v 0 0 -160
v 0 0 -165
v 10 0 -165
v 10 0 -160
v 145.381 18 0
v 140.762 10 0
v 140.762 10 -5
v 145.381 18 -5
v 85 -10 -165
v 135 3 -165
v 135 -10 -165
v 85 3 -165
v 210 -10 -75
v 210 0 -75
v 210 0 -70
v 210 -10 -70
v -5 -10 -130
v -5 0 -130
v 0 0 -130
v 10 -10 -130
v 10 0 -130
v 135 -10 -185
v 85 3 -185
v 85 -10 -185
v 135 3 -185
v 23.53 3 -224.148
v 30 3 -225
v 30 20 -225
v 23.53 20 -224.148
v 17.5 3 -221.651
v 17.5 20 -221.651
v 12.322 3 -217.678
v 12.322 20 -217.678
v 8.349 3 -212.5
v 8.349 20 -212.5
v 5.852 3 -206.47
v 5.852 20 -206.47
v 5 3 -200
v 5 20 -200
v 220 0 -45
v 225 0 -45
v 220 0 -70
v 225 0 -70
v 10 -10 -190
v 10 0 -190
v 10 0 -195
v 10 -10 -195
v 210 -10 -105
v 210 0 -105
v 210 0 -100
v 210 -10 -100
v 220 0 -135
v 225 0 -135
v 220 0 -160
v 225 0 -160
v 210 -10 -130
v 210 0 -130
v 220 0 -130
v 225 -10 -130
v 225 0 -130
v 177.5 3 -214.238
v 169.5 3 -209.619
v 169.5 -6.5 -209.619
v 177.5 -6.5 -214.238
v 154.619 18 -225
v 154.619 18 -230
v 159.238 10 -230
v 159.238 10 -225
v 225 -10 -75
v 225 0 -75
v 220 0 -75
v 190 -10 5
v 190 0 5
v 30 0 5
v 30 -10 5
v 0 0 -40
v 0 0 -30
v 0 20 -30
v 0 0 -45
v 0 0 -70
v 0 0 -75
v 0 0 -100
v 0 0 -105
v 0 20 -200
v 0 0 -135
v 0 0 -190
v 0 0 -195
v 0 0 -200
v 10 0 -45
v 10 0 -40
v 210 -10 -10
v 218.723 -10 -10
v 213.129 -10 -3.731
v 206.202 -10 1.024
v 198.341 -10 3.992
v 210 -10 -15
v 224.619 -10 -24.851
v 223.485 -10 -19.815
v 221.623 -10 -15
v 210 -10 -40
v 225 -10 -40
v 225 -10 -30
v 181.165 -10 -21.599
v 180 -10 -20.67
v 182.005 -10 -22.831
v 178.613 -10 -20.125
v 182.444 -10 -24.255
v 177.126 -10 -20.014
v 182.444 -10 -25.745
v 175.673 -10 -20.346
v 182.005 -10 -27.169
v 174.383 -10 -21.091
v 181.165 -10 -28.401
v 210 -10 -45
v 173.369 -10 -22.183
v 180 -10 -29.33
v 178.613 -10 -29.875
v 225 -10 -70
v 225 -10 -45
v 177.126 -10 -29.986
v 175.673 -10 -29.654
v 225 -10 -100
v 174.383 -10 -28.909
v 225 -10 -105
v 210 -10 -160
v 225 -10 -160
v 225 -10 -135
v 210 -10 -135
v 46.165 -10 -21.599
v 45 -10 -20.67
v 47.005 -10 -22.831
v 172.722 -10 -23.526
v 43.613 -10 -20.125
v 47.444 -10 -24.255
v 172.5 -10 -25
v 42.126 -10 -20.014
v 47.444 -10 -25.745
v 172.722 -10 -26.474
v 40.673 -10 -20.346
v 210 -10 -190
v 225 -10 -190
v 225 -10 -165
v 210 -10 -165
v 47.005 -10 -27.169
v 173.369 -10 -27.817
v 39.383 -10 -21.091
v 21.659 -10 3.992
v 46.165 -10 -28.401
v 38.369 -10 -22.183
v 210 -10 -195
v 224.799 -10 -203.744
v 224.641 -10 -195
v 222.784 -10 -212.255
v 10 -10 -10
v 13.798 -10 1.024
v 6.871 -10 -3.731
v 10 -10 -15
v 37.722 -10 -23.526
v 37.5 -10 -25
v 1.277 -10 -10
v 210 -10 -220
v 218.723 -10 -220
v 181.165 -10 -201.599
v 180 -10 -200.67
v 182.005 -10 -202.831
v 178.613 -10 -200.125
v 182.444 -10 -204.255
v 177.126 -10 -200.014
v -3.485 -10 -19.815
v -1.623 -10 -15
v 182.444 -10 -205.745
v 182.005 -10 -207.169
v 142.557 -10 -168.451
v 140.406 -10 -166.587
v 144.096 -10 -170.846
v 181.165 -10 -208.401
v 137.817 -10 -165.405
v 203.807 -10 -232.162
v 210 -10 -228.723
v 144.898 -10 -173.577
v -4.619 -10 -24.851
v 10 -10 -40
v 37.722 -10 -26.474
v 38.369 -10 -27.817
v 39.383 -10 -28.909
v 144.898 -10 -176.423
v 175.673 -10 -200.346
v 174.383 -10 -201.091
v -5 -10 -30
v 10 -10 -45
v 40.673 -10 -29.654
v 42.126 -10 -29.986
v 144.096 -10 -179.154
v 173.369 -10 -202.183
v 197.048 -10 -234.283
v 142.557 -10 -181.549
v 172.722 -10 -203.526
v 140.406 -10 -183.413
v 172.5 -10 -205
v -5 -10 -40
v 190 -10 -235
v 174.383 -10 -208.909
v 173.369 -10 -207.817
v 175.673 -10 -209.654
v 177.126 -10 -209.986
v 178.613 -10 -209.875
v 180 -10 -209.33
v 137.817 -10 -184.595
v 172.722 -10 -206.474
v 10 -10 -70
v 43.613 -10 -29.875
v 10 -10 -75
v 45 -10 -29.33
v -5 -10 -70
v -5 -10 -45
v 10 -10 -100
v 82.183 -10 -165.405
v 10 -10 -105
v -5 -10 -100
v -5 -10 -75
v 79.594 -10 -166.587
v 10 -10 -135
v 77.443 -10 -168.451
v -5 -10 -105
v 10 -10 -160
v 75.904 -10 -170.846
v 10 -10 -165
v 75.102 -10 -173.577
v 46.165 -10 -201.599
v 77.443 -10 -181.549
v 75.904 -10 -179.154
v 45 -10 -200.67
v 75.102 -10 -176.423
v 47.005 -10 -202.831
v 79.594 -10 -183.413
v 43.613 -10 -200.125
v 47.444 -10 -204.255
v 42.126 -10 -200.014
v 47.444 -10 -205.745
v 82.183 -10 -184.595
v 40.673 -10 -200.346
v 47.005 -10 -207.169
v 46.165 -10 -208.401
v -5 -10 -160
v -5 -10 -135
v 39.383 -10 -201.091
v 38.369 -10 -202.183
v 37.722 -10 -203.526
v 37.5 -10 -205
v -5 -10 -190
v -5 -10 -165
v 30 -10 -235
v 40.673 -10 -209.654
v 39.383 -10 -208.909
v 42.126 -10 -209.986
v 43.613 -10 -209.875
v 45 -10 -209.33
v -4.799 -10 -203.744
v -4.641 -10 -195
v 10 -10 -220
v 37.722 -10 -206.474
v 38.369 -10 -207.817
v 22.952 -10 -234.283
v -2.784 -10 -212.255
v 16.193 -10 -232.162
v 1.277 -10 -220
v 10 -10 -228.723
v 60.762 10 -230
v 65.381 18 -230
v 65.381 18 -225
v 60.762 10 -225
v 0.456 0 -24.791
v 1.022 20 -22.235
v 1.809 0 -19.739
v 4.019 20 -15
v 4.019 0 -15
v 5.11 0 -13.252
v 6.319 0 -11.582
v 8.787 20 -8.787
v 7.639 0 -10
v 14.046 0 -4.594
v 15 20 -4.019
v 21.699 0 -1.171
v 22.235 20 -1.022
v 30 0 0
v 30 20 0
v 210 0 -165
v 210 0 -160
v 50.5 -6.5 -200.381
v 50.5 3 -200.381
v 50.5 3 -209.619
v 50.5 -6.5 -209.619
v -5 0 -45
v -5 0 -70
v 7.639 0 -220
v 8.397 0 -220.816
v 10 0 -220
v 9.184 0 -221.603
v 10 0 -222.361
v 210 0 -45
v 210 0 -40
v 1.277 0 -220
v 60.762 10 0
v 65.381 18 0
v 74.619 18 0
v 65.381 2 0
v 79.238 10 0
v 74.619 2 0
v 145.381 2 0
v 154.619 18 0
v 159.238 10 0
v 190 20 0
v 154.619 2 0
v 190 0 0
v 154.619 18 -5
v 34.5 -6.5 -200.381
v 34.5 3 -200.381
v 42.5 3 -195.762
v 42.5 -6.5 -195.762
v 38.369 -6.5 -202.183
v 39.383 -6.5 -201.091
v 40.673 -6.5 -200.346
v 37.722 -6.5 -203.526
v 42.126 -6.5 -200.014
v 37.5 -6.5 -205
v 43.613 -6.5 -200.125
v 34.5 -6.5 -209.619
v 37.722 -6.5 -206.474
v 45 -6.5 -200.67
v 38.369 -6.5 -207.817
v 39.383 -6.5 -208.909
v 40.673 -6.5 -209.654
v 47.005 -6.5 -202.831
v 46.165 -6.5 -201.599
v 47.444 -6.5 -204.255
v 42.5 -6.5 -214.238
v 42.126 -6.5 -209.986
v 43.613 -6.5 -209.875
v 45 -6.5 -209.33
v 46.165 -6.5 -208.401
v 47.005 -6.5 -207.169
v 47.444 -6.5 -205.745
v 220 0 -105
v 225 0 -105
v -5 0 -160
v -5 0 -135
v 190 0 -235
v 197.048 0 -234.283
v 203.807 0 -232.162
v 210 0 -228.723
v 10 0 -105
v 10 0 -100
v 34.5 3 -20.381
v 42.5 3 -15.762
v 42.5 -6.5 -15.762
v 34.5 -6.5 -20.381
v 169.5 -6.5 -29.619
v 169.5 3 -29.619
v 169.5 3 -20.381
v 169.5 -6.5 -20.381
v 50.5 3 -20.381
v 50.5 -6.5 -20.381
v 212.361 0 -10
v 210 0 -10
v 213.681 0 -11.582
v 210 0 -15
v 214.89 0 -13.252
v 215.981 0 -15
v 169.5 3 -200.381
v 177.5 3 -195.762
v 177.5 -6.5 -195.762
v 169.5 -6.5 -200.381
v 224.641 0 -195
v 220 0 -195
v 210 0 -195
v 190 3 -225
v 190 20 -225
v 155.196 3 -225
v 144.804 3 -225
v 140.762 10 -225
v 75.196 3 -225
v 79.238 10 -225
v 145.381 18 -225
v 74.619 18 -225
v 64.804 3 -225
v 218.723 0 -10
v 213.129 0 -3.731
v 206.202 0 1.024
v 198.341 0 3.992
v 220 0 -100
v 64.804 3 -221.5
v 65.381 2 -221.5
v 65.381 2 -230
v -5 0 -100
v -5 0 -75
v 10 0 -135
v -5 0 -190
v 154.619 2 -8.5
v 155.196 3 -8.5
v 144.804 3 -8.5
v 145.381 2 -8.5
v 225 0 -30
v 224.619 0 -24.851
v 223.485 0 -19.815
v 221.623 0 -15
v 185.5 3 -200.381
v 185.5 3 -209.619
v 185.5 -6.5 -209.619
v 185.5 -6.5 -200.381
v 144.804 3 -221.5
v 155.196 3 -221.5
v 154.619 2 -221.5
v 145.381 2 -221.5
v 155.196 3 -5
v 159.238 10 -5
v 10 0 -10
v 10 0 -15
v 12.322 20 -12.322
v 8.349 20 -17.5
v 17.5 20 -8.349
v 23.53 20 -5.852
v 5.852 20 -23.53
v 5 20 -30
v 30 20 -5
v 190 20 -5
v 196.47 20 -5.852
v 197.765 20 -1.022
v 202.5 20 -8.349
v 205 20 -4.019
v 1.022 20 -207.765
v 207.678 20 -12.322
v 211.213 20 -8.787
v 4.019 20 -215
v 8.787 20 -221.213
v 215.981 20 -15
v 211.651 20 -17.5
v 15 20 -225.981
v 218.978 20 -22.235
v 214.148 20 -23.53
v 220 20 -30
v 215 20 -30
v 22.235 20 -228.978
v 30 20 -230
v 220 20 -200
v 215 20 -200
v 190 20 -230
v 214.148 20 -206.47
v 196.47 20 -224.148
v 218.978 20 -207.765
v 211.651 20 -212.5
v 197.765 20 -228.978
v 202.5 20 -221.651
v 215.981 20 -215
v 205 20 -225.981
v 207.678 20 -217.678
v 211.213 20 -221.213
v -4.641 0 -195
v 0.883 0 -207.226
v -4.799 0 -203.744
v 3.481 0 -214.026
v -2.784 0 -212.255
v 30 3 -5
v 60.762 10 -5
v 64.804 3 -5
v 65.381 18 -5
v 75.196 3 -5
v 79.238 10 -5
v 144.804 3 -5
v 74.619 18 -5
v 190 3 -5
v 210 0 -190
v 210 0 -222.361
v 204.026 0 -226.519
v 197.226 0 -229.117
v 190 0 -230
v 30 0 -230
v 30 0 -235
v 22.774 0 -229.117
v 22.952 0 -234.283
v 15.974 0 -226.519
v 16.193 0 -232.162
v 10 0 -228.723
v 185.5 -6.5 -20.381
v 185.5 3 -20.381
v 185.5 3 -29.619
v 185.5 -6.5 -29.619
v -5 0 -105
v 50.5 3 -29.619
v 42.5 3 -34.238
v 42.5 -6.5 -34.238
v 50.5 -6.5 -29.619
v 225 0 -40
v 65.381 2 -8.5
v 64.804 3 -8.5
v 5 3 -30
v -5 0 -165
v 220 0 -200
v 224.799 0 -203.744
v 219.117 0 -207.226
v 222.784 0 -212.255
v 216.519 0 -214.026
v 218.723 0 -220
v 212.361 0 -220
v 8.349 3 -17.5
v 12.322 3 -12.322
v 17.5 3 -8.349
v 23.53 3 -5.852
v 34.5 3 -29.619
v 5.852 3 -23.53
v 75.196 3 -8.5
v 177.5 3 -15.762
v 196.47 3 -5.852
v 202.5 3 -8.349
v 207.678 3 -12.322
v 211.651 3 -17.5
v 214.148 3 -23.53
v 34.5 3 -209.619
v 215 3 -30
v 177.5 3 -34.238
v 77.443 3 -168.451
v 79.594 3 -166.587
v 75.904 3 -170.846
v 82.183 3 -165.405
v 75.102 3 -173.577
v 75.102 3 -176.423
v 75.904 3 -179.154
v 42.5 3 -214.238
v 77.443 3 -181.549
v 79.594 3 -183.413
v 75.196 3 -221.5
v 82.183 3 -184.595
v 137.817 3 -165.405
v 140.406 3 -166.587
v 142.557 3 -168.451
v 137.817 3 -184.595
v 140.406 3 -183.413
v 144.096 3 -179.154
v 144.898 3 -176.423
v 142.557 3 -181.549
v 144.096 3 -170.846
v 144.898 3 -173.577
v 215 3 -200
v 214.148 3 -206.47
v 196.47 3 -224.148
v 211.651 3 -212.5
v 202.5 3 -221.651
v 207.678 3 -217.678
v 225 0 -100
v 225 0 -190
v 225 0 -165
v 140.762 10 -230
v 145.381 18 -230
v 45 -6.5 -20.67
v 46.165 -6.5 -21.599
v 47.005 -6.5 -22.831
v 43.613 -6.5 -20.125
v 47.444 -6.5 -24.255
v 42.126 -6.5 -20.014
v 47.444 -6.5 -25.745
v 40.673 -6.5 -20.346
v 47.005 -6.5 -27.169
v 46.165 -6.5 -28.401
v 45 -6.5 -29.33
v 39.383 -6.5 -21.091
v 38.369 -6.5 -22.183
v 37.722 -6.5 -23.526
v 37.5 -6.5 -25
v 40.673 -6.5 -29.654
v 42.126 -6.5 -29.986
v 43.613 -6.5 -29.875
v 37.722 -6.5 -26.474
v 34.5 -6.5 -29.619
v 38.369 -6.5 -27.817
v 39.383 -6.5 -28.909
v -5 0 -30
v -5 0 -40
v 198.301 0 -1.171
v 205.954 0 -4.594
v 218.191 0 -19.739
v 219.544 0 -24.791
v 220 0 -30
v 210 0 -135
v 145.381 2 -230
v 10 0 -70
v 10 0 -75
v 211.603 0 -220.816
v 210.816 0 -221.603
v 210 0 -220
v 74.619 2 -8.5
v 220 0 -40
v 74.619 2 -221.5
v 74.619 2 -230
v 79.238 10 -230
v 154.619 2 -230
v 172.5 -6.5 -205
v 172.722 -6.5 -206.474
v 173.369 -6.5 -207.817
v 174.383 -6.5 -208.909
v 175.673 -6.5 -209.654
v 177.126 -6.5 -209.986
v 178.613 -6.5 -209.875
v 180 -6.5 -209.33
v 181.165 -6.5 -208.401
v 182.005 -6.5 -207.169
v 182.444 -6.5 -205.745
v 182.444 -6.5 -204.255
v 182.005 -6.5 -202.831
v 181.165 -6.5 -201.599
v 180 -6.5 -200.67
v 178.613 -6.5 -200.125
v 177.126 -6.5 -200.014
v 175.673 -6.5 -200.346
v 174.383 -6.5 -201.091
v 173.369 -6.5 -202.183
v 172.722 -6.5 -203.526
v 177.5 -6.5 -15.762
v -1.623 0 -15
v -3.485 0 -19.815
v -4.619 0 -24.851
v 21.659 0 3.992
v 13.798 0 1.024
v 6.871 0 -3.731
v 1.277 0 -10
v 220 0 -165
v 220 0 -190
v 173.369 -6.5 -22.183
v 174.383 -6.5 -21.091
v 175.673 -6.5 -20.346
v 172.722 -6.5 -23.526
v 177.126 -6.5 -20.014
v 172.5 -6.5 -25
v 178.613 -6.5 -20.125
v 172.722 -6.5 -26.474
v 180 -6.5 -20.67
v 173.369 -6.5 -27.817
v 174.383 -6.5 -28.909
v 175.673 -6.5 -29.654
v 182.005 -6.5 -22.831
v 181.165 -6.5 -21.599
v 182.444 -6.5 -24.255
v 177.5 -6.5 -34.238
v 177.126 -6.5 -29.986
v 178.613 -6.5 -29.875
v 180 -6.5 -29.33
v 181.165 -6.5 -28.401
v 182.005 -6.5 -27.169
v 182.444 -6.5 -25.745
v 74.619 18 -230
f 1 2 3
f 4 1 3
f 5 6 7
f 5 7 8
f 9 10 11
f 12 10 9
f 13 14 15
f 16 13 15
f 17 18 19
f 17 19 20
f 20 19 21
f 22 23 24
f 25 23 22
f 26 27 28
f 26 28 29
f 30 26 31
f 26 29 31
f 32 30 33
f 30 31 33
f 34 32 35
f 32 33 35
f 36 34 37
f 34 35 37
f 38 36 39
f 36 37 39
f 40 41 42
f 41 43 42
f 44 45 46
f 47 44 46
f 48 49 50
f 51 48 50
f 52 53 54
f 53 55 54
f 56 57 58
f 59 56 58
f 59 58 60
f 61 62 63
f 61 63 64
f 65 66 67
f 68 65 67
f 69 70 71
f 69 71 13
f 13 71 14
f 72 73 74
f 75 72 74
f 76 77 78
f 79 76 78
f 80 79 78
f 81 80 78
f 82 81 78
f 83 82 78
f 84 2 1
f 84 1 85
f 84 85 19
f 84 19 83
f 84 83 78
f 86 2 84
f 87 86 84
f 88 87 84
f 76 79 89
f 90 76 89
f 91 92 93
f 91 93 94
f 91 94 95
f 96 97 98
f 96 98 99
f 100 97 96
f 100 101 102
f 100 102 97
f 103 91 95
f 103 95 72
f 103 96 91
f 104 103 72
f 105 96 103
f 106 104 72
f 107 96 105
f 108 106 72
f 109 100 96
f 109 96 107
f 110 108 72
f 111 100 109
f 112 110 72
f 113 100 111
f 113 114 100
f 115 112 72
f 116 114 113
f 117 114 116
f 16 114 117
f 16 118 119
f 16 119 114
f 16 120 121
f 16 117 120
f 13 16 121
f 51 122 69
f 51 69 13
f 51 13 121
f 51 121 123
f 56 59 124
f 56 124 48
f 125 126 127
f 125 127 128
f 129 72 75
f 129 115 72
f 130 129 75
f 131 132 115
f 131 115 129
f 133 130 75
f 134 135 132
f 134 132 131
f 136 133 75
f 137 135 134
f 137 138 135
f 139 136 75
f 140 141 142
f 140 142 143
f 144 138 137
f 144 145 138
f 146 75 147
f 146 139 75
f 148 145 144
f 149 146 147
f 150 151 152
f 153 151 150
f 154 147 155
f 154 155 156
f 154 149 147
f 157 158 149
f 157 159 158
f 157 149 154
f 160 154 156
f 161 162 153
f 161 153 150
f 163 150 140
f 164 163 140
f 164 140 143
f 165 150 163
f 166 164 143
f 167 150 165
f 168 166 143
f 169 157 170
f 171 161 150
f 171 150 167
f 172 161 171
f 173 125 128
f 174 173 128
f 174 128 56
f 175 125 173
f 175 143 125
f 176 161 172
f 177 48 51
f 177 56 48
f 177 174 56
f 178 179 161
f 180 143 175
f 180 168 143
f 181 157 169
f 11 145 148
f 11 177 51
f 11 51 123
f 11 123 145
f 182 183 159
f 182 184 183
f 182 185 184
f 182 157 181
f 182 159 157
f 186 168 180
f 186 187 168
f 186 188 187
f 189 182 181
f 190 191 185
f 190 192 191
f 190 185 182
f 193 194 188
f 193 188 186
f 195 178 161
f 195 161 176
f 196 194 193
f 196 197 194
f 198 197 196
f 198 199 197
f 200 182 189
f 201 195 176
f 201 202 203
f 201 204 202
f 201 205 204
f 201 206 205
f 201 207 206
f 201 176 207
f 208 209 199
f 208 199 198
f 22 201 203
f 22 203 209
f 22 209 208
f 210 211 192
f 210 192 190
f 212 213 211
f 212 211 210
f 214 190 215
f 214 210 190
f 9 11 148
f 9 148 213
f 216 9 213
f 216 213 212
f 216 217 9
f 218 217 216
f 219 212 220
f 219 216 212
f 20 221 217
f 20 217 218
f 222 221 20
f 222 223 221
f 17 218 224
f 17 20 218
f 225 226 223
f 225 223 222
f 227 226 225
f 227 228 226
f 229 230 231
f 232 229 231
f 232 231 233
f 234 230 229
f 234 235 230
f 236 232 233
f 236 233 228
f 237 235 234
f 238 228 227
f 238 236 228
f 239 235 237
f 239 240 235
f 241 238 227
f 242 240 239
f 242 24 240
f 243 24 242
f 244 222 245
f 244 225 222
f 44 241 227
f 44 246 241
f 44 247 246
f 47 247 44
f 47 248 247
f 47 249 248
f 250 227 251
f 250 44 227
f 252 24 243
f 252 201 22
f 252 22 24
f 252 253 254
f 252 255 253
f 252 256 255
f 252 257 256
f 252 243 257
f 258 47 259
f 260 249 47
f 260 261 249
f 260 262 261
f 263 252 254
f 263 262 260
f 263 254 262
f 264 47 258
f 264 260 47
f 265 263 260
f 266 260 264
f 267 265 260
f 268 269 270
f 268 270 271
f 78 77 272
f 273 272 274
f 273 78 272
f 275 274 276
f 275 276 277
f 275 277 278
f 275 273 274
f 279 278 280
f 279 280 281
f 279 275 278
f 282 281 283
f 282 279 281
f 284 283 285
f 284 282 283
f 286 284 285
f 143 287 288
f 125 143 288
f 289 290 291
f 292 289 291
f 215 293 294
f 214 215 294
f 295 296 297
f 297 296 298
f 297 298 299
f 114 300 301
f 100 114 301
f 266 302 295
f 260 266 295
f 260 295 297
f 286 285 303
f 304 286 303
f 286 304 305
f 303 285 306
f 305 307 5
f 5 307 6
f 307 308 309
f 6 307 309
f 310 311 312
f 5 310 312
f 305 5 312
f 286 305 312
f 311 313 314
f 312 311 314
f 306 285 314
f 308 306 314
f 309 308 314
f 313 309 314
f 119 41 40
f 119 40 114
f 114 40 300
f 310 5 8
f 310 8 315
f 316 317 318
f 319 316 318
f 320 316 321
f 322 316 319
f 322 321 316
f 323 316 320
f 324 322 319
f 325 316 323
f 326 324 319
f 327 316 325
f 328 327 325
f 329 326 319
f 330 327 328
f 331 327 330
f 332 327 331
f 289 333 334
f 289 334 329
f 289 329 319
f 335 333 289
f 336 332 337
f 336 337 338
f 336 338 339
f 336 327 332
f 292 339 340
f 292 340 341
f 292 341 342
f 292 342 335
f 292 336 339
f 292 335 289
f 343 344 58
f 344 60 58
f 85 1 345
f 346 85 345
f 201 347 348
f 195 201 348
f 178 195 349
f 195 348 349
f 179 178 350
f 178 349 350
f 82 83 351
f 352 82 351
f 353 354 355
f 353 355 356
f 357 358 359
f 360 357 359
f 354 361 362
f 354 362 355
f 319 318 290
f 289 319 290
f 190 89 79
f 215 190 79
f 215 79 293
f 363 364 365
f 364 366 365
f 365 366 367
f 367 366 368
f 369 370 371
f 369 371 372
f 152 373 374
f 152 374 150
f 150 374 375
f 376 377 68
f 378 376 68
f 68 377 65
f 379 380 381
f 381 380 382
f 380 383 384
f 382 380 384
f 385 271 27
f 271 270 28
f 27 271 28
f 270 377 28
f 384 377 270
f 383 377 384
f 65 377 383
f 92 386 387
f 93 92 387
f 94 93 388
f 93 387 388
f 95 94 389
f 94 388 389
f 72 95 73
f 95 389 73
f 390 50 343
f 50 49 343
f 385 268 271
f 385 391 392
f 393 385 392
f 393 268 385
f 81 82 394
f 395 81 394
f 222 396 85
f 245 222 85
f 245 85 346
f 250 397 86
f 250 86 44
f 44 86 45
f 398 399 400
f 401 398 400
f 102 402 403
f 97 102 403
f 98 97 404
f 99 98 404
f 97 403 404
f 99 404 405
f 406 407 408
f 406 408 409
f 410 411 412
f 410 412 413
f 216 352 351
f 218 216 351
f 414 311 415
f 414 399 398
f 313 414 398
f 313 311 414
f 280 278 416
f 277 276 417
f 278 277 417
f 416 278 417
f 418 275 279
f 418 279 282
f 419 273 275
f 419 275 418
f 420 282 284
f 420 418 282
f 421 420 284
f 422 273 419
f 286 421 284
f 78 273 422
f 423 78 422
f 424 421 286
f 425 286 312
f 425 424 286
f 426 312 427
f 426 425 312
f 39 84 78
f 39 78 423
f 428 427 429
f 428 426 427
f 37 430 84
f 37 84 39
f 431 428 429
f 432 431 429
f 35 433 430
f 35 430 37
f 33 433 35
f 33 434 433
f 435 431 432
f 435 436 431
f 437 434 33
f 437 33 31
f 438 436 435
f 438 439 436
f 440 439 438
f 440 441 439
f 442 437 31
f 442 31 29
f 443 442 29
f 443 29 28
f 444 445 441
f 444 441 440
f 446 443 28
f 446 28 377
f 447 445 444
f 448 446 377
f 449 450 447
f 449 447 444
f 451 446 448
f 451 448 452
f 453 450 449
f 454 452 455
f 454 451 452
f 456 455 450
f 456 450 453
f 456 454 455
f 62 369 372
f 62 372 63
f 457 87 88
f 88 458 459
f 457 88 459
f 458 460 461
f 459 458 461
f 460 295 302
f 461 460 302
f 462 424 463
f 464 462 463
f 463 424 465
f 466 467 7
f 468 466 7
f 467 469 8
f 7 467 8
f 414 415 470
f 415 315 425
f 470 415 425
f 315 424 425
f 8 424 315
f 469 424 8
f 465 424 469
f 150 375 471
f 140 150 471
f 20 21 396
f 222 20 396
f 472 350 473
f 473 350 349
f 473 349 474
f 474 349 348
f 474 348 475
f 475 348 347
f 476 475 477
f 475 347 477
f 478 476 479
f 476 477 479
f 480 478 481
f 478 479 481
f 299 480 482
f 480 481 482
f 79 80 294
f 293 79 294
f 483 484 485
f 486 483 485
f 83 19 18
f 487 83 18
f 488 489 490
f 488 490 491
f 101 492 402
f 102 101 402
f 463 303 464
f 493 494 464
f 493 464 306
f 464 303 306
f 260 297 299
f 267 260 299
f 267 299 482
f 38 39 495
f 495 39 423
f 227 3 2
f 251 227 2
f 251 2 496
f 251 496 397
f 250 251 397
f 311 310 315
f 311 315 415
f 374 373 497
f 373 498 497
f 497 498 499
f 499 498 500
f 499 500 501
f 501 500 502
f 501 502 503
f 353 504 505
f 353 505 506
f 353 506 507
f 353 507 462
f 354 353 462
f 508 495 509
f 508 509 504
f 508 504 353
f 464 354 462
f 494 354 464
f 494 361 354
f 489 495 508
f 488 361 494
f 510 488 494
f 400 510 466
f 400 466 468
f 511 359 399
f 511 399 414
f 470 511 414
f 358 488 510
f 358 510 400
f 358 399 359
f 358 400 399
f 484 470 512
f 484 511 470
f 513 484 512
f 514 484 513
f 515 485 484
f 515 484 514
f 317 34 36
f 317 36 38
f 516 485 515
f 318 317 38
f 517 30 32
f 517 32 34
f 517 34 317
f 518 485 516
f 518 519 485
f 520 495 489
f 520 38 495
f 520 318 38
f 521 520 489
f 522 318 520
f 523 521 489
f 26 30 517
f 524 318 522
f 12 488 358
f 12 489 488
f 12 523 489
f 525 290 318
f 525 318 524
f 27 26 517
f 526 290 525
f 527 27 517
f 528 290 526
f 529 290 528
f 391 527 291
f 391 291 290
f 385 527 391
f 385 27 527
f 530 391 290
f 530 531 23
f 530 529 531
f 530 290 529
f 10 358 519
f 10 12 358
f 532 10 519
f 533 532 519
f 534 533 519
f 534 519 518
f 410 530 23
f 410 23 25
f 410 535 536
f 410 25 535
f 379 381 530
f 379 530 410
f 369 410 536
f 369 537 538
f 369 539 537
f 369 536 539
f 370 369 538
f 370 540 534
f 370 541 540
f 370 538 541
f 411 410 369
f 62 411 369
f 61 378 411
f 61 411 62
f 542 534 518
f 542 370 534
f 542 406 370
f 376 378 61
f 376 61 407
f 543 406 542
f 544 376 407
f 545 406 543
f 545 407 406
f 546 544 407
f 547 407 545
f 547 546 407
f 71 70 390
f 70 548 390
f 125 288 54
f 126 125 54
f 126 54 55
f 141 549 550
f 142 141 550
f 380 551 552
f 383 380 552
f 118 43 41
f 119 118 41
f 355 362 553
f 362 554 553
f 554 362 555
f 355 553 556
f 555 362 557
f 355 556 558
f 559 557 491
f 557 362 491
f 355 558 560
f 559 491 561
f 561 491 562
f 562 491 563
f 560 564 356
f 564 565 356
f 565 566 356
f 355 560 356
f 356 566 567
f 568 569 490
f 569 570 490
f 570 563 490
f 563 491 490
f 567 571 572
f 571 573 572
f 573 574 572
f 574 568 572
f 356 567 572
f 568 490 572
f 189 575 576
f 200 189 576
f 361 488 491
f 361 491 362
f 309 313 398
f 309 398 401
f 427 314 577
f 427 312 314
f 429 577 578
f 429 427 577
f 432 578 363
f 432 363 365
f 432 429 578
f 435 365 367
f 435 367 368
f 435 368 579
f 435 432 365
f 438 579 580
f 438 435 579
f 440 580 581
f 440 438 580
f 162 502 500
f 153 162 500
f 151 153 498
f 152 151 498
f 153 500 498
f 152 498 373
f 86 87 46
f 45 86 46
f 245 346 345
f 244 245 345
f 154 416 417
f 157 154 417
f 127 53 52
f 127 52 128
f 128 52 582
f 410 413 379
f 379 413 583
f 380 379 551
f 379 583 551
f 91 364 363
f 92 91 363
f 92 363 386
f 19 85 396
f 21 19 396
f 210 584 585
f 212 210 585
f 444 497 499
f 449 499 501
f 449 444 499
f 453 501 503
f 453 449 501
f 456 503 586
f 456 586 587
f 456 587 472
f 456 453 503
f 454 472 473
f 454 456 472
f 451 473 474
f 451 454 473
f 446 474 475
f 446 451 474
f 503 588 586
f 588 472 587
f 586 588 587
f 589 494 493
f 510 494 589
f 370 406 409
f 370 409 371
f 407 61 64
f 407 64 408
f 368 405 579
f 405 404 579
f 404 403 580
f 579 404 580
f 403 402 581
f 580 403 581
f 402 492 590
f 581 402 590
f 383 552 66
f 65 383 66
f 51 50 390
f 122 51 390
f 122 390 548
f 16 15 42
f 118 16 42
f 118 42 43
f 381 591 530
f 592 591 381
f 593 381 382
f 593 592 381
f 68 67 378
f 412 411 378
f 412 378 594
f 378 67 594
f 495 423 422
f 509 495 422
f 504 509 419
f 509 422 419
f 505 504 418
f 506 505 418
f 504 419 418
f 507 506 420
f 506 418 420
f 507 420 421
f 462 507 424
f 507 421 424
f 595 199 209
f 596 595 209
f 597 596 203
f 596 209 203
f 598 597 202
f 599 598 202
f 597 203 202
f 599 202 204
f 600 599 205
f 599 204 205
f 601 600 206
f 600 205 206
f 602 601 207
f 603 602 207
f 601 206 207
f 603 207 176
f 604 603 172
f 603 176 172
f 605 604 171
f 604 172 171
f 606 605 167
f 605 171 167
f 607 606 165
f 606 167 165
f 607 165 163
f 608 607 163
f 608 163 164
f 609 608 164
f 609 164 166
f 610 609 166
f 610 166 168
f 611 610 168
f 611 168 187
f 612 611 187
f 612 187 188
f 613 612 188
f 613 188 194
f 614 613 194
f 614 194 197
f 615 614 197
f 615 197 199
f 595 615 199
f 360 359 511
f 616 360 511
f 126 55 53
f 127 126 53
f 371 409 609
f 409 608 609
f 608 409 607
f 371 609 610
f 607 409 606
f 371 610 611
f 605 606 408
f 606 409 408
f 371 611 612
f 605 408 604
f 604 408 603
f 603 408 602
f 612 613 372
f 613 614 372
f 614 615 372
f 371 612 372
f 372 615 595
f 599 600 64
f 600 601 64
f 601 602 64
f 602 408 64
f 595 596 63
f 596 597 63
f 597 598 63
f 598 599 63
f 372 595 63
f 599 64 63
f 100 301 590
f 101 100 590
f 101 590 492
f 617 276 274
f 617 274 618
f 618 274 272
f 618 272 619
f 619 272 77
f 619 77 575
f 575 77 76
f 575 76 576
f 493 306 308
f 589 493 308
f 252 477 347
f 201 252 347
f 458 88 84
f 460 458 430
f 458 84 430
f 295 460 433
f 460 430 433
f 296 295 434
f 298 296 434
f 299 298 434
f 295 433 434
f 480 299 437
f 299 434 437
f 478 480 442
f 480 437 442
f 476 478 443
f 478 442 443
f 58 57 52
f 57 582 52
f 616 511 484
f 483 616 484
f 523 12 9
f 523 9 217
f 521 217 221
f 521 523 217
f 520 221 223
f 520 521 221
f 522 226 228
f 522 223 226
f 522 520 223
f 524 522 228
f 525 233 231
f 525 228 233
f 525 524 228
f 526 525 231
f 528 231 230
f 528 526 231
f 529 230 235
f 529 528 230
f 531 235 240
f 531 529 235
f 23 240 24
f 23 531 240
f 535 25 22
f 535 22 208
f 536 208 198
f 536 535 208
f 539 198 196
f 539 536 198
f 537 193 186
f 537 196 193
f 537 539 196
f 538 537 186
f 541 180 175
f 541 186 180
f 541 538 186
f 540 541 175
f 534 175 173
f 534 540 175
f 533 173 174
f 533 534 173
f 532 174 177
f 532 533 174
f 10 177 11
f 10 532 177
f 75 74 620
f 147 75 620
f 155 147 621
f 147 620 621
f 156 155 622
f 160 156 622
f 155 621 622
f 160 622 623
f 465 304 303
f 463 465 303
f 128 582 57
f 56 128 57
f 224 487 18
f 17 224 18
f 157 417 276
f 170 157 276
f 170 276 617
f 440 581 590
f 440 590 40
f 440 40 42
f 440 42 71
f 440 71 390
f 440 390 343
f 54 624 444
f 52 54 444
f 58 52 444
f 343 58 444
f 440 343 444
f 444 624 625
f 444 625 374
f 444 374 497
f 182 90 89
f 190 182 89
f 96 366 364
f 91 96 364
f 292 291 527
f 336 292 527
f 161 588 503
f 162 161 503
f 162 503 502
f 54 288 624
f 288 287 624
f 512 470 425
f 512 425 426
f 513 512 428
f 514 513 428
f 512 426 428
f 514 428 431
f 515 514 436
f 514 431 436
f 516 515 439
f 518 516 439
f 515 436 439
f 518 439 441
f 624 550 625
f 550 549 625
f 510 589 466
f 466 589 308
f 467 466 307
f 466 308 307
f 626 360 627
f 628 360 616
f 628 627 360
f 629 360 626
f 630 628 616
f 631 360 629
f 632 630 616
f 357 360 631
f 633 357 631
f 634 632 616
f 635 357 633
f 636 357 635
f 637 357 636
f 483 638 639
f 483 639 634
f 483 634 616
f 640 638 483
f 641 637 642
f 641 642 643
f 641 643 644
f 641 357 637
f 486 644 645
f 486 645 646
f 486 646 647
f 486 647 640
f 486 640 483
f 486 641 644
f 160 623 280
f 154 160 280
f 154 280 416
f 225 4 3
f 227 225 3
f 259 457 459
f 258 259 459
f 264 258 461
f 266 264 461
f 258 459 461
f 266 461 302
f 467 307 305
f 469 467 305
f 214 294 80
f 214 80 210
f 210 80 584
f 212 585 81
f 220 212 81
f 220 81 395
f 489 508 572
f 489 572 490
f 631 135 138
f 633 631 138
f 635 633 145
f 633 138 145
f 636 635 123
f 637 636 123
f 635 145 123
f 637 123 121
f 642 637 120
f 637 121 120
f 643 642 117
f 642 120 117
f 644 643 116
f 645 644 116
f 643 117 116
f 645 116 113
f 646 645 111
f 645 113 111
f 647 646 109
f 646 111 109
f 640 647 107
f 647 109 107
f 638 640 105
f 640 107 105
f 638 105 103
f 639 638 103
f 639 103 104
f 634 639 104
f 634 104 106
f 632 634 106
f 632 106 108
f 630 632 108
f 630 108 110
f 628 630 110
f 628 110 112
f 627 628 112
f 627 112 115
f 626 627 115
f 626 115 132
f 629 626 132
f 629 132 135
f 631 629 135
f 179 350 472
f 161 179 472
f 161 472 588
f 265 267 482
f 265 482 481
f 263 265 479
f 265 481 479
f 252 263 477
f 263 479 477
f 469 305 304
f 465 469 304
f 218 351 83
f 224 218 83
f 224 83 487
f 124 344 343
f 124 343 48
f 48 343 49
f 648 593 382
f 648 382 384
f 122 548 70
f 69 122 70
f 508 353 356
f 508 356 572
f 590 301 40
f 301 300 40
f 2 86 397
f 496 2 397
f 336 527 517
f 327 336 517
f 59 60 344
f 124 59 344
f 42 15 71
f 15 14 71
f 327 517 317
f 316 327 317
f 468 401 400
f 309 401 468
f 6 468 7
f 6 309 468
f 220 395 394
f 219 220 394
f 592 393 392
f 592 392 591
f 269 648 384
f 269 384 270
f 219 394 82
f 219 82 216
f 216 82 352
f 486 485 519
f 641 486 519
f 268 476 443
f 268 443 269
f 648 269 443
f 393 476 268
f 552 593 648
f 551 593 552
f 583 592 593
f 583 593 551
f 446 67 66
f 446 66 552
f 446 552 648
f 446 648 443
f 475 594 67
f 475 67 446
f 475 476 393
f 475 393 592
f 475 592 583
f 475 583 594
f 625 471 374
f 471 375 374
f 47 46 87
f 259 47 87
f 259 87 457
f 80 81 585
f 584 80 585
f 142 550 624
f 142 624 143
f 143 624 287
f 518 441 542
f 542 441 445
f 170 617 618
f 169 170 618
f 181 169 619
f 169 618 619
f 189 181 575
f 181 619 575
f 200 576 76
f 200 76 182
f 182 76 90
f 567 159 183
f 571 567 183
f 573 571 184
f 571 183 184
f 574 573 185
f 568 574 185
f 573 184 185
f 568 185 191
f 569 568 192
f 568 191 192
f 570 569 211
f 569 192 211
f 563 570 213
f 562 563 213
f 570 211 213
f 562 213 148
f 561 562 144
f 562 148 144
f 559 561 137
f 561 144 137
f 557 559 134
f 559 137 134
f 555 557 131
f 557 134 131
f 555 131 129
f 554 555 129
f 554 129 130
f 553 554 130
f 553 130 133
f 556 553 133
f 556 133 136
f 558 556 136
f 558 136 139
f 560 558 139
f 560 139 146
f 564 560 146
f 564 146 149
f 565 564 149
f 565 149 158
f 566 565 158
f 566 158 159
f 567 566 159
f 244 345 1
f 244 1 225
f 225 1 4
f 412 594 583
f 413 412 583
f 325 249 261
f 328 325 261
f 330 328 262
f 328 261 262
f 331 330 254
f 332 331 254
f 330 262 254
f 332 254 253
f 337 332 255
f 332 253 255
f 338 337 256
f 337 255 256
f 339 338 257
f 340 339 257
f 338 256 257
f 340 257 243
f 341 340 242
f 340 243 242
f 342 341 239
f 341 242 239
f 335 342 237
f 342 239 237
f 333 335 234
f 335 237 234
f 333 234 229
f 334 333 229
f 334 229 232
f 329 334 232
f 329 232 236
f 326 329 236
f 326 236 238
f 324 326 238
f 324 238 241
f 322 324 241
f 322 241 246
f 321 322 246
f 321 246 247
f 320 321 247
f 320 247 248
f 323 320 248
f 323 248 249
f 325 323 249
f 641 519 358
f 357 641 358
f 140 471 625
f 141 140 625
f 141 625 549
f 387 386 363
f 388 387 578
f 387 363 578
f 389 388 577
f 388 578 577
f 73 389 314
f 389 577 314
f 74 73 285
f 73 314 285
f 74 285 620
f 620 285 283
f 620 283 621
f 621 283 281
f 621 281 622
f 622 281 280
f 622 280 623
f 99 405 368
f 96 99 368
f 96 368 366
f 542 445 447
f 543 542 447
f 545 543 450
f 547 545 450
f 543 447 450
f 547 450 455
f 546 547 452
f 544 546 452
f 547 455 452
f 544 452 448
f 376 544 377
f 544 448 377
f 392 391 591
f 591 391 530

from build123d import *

# Parameters (mm, degrees)
SKETCH1_W           = 220
SKETCH1_H           = 230
BOSS_EXTRUDE1_DEPTH = 20
FILLET1_R           = 30
BOSS_EXTRUDE4_DEPTH = 10
CUT_EXTRUDE10_DEPTH = 17
SKETCH7_R           = 5
CUT_EXTRUDE3_DEPTH  = 31
SKETCH8_R           = 5
CUT_EXTRUDE4_DEPTH  = 30
SKETCH13_R          = 5
CUT_EXTRUDE5_DEPTH  = 30
CUT_EXTRUDE6_DEPTH  = 8.5
CUT_EXTRUDE7_DEPTH  = 8.5
CUT_EXTRUDE8_DEPTH  = 26.5
CUT_EXTRUDE9_DEPTH  = 31


with BuildPart() as part:
    # Sketch1 → Boss-Extrude1 (new body)
    with BuildSketch(Plane(origin=(0, 0, 0), x_dir=(1, 0, 0), z_dir=(0, 1, 0))):
        with Locations((110, 115)):
            Rectangle(SKETCH1_W, SKETCH1_H)
    extrude(amount=BOSS_EXTRUDE1_DEPTH)

    # Fillet1
    fillet1_edges = [part.edges().sort_by_distance(p)[0] for p in [
        (0, 10, -230),
        (220, 10, -230),
        (220, 10, 0),
        (0, 10, 0),
    ]]
    fillet(fillet1_edges, radius=FILLET1_R)

    # Sketch4 → Boss-Extrude4 (add)
    with BuildSketch(Plane(origin=(0, 0, 0), x_dir=(-1, 0, 0), z_dir=(0, -1, 0))):
        with BuildLine():
            Line((-210, 10), (-218.722813233, 10))
            ThreePointArc((-218.722813233, 10), (-206.201851746, -1.024184115), (-190, -5))
            Line((-190, -5), (-30, -5))
            ThreePointArc((-30, -5), (-13.798148254, -1.024184115), (-1.277186767, 10))
            Line((-1.277186767, 10), (-10, 10))
            Line((-10, 10), (-10, 15))
            Line((-10, 15), (1.622776602, 15))
            ThreePointArc((1.622776602, 15), (4.145257219, 22.312255892), (5, 30))
            Line((5, 30), (5, 40))
            Line((5, 40), (-10, 40))
            Line((-10, 40), (-10, 45))
            Line((-10, 45), (5, 45))
            Line((5, 45), (5, 70))
            Line((5, 70), (-10, 70))
            Line((-10, 70), (-10, 75))
            Line((-10, 75), (5, 75))
            Line((5, 75), (5, 100))
            Line((5, 100), (-10, 100))
            Line((-10, 100), (-10, 105))
            Line((-10, 105), (5, 105))
            Line((5, 105), (5, 130))
            Line((5, 130), (-10, 130))
            Line((-10, 130), (-10, 135))
            Line((-10, 135), (5, 135))
            Line((5, 135), (5, 160))
            Line((5, 160), (-10, 160))
            Line((-10, 160), (-10, 165))
            Line((-10, 165), (5, 165))
            Line((5, 165), (5, 190))
            Line((5, 190), (-10, 190))
            Line((-10, 190), (-10, 195))
            Line((-10, 195), (4.641016151, 195))
            ThreePointArc((4.641016151, 195), (4.058680517, 208.062647298), (-1.277186767, 220))
            Line((-1.277186767, 220), (-10, 220))
            Line((-10, 220), (-10, 228.722813233))
            ThreePointArc((-10, 228.722813233), (-19.519028269, 233.393850206), (-30, 235))
            Line((-30, 235), (-190, 235))
            ThreePointArc((-190, 235), (-200.480971731, 233.393850206), (-210, 228.722813233))
            Line((-210, 228.722813233), (-210, 220))
            Line((-210, 220), (-218.722813233, 220))
            ThreePointArc((-218.722813233, 220), (-224.058680517, 208.062647298), (-224.641016151, 195))
            Line((-224.641016151, 195), (-210, 195))
            Line((-210, 195), (-210, 190))
            Line((-210, 190), (-225, 190))
            Line((-225, 190), (-225, 165))
            Line((-225, 165), (-210, 165))
            Line((-210, 165), (-210, 160))
            Line((-210, 160), (-225, 160))
            Line((-225, 160), (-225, 135))
            Line((-225, 135), (-210, 135))
            Line((-210, 135), (-210, 130))
            Line((-210, 130), (-225, 130))
            Line((-225, 130), (-225, 105))
            Line((-225, 105), (-210, 105))
            Line((-210, 105), (-210, 100))
            Line((-210, 100), (-225, 100))
            Line((-225, 100), (-225, 75))
            Line((-225, 75), (-210, 75))
            Line((-210, 75), (-210, 70))
            Line((-210, 70), (-225, 70))
            Line((-225, 70), (-225, 45))
            Line((-225, 45), (-210, 45))
            Line((-210, 45), (-210, 40))
            Line((-210, 40), (-225, 40))
            Line((-225, 40), (-225, 30))
            ThreePointArc((-225, 30), (-224.145257219, 22.312255892), (-221.622776602, 15))
            Line((-221.622776602, 15), (-210, 15))
            Line((-210, 15), (-210, 10))
        make_face()
    extrude(amount=BOSS_EXTRUDE4_DEPTH)

    # Sketch20 → Cut-Extrude10 (cut)
    with BuildSketch(Plane(origin=(0, 20, 0), x_dir=(1, 0, 0), z_dir=(0, 1, 0))):
        with BuildLine():
            Line((215, 30), (215, 200))
            ThreePointArc((215, 200), (207.67766953, 217.67766953), (190, 225))
            Line((190, 225), (30, 225))
            ThreePointArc((30, 225), (12.32233047, 217.67766953), (5, 200))
            Line((5, 200), (5, 30))
            ThreePointArc((5, 30), (12.32233047, 12.32233047), (30, 5))
            Line((30, 5), (190, 5))
            ThreePointArc((190, 5), (207.67766953, 12.32233047), (215, 30))
        make_face()
    extrude(amount=-CUT_EXTRUDE10_DEPTH, mode=Mode.SUBTRACT)

    # Sketch7 → Cut-Extrude3 (cut, through all)
    with BuildSketch(Plane(origin=(0, -10, 0), x_dir=(-1, 0, 0), z_dir=(0, -1, 0))):
        with Locations((-42.5, 25)):
            Circle(SKETCH7_R)
        with Locations((-177.5, 25)):
            Circle(SKETCH7_R)
        with Locations((-177.5, 205)):
            Circle(SKETCH7_R)
        with Locations((-42.5, 205)):
            Circle(SKETCH7_R)
    extrude(amount=-CUT_EXTRUDE3_DEPTH, mode=Mode.SUBTRACT)

    # Sketch8 → Cut-Extrude4 (cut)
    with BuildSketch(Plane(origin=(0, 0, -230), x_dir=(-1, 0, 0), z_dir=(0, 0, -1))):
        with Locations((-150, 10)):
            Circle(SKETCH8_R)
        with Locations((-70, 10)):
            Circle(SKETCH8_R)
    extrude(amount=-CUT_EXTRUDE4_DEPTH, mode=Mode.SUBTRACT)

    # Sketch13 → Cut-Extrude5 (cut)
    with BuildSketch(Plane.XY):
        with Locations((70, 10)):
            Circle(SKETCH13_R)
        with Locations((150, 10)):
            Circle(SKETCH13_R)
    extrude(amount=-CUT_EXTRUDE5_DEPTH, mode=Mode.SUBTRACT)

    # Sketch17 → Cut-Extrude6 (cut)
    with BuildSketch(Plane.XY):
        Polygon((60.762395693, 10), (65.381197846, 2), (74.618802154, 2), (79.237604307, 10), (74.618802154, 18), (65.381197846, 18), align=None)
        Polygon((154.618802154, 18), (159.237604307, 10), (154.618802154, 2), (145.381197846, 2), (140.762395693, 10), (145.381197846, 18), align=None)
    extrude(amount=-CUT_EXTRUDE6_DEPTH, mode=Mode.SUBTRACT)

    # Sketch16 → Cut-Extrude7 (cut)
    with BuildSketch(Plane(origin=(0, 0, -230), x_dir=(-1, 0, 0), z_dir=(0, 0, -1))):
        Polygon((-159.237604307, 10), (-154.618802154, 2), (-145.381197846, 2), (-140.762395693, 10), (-145.381197846, 18), (-154.618802154, 18), align=None)
        Polygon((-65.381197846, 18), (-60.762395693, 10), (-65.381197846, 2), (-74.618802154, 2), (-79.237604307, 10), (-74.618802154, 18), align=None)
    extrude(amount=-CUT_EXTRUDE7_DEPTH, mode=Mode.SUBTRACT)

    # Sketch18 → Cut-Extrude8 (cut)
    with BuildSketch(Plane(origin=(0, 20, 0), x_dir=(1, 0, 0), z_dir=(0, 1, 0))):
        Polygon((42.5, 195.762395693), (50.5, 200.381197846), (50.5, 209.618802154), (42.5, 214.237604307), (34.5, 209.618802154), (34.5, 200.381197846), align=None)
        Polygon((185.5, 200.381197846), (177.5, 195.762395693), (169.5, 200.381197846), (169.5, 209.618802154), (177.5, 214.237604307), (185.5, 209.618802154), align=None)
        Polygon((185.5, 20.381197846), (185.5, 29.618802154), (177.5, 34.237604307), (169.5, 29.618802154), (169.5, 20.381197846), (177.5, 15.762395693), align=None)
        Polygon((34.5, 29.618802154), (42.5, 34.237604307), (50.5, 29.618802154), (50.5, 20.381197846), (42.5, 15.762395693), (34.5, 20.381197846), align=None)
    extrude(amount=-CUT_EXTRUDE8_DEPTH, mode=Mode.SUBTRACT)

    # Sketch19 → Cut-Extrude9 (cut, through all)
    with BuildSketch(Plane(origin=(0, 20, 0), x_dir=(1, 0, 0), z_dir=(0, 1, 0))):
        with BuildLine():
            Line((85, 185), (135, 185))
            ThreePointArc((135, 185), (145, 175), (135, 165))
            Line((135, 165), (85, 165))
            ThreePointArc((85, 165), (75, 175), (85, 185))
        make_face()
    extrude(amount=-CUT_EXTRUDE9_DEPTH, mode=Mode.SUBTRACT)


solid = part.part
